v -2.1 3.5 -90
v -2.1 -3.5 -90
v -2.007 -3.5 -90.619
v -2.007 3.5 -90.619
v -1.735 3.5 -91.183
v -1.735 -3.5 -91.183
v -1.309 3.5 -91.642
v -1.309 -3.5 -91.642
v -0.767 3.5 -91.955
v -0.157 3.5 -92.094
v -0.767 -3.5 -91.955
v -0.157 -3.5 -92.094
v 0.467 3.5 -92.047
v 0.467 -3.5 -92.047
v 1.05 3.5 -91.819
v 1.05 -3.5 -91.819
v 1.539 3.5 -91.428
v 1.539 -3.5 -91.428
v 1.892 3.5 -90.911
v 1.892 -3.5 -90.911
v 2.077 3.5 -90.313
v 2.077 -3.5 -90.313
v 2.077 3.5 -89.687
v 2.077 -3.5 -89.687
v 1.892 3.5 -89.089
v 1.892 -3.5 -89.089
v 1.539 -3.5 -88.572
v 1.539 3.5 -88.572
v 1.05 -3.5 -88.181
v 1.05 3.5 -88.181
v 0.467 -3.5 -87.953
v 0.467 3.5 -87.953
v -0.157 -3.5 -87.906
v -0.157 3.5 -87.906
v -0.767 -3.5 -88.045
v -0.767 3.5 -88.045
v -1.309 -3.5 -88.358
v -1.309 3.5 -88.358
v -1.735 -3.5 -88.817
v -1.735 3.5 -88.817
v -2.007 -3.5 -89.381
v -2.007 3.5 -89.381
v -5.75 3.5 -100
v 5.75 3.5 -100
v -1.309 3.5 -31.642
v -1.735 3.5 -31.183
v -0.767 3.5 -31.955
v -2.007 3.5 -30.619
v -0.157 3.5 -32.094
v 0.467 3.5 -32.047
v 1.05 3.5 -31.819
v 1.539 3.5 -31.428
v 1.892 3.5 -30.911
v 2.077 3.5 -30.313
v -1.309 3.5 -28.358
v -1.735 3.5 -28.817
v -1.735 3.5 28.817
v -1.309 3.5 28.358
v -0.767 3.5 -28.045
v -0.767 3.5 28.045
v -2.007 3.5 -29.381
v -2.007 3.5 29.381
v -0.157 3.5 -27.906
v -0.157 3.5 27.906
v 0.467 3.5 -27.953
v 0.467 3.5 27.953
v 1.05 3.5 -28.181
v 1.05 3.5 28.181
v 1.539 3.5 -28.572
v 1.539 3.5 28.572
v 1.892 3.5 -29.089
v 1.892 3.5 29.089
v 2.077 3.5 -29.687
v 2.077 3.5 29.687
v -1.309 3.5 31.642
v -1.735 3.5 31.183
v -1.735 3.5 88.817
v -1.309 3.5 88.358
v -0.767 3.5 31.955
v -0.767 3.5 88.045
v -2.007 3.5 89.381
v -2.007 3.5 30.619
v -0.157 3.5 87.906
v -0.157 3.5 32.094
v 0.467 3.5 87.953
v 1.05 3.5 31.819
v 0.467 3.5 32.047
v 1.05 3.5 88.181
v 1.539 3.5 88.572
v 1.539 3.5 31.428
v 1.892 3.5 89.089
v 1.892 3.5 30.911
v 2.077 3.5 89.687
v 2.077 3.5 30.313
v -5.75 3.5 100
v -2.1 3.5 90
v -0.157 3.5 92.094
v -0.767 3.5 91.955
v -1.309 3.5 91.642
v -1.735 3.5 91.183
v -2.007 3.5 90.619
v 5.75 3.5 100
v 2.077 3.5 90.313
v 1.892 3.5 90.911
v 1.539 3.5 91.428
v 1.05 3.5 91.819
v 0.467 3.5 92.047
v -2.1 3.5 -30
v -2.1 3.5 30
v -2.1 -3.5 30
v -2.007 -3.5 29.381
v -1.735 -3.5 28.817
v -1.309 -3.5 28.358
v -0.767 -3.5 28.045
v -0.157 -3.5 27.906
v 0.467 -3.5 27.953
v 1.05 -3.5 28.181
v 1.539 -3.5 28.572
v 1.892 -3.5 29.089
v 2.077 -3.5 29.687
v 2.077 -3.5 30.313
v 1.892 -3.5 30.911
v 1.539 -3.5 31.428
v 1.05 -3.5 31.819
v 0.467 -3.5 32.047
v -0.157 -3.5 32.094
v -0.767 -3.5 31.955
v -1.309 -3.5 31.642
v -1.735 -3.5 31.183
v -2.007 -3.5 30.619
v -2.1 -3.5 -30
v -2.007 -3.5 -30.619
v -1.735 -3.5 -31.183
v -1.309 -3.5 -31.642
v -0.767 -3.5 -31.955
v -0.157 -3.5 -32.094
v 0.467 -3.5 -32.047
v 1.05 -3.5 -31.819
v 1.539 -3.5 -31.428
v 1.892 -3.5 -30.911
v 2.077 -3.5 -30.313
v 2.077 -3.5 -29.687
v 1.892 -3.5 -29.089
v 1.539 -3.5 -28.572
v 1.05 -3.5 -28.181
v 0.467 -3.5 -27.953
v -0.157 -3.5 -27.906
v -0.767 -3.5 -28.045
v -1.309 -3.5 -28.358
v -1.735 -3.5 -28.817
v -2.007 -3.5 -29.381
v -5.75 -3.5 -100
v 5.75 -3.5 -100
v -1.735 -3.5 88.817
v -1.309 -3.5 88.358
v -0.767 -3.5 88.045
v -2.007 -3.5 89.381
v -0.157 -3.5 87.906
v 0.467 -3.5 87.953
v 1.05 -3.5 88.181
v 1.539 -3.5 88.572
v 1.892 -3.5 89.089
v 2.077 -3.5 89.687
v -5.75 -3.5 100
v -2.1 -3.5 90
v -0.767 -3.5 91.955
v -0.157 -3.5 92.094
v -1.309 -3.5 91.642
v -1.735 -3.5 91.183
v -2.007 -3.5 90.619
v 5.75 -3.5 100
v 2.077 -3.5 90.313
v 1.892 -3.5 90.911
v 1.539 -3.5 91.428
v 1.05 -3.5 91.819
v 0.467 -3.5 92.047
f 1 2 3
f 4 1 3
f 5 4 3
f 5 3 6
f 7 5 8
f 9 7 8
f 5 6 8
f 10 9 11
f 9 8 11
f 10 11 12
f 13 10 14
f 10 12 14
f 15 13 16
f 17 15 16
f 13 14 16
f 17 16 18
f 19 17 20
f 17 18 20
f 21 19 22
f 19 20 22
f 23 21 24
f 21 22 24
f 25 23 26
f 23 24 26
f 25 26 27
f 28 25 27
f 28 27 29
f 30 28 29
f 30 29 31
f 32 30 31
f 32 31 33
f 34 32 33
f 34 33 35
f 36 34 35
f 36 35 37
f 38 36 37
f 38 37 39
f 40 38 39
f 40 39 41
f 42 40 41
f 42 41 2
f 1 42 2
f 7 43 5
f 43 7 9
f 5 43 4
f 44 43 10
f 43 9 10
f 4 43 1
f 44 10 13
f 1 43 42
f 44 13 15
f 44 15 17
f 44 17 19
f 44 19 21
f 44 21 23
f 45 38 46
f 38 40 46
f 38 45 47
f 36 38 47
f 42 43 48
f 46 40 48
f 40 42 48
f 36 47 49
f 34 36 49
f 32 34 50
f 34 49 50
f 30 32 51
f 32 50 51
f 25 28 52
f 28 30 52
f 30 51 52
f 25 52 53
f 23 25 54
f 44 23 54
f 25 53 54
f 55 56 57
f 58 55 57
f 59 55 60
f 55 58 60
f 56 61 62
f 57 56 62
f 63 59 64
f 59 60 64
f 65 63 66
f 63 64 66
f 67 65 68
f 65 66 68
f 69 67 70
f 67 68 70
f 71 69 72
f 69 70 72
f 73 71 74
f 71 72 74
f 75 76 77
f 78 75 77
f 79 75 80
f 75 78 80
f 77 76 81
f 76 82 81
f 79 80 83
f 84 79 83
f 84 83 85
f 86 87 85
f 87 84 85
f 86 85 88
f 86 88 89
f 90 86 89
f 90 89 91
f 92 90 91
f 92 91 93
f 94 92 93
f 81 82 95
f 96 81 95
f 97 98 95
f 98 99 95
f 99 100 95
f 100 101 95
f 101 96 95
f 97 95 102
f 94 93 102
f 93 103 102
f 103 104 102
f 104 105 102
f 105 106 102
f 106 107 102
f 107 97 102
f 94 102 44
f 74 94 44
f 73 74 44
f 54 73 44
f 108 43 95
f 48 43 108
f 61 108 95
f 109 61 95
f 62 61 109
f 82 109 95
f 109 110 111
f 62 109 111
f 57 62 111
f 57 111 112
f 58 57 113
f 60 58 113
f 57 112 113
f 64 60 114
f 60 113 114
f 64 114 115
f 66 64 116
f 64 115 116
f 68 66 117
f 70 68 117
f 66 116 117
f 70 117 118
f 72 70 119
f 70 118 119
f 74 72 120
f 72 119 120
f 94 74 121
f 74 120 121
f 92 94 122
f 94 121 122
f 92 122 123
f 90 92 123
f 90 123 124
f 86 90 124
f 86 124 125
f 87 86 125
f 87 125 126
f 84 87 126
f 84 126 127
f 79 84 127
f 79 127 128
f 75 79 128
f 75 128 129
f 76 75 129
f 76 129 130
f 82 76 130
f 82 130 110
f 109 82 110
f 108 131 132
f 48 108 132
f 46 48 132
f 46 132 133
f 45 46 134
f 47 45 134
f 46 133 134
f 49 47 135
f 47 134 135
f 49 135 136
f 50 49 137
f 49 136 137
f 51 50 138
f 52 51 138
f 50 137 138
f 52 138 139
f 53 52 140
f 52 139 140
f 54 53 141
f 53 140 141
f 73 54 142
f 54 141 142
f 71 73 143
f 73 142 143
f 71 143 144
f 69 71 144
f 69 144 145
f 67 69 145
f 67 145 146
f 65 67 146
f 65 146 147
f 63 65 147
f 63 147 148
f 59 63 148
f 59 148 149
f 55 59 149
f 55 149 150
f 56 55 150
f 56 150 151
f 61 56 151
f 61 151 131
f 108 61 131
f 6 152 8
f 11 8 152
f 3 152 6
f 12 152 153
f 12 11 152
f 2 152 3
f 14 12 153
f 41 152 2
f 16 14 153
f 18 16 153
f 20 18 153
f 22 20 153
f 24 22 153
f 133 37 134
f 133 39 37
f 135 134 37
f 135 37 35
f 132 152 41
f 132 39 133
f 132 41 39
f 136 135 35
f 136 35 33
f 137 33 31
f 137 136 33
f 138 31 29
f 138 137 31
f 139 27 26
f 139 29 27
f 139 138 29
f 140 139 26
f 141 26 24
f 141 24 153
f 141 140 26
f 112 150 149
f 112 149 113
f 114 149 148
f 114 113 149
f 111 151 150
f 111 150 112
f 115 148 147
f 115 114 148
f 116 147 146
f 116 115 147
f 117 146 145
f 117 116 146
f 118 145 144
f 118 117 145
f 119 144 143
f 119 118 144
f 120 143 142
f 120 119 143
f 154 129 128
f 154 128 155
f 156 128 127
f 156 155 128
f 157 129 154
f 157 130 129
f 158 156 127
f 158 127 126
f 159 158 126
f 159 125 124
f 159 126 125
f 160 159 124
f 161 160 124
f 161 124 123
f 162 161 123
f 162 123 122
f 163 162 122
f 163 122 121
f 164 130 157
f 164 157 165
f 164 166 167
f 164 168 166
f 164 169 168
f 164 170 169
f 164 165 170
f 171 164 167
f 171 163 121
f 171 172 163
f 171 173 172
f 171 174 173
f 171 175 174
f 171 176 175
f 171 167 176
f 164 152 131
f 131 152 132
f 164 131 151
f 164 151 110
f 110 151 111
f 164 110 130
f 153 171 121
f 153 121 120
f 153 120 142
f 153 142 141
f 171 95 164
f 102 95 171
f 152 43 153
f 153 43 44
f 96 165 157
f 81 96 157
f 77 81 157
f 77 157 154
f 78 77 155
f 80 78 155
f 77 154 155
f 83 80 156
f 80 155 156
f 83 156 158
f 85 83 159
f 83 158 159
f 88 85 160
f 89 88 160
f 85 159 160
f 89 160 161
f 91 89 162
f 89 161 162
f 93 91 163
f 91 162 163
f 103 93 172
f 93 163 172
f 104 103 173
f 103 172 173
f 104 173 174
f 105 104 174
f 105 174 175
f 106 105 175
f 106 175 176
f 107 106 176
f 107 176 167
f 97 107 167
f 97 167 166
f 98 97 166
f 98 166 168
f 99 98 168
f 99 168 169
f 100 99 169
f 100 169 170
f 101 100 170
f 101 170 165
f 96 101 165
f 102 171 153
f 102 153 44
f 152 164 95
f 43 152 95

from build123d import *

# Parameters (mm, degrees)
SKETCH1_W           = 11.5
SKETCH1_H           = 7
BOSS_EXTRUDE1_DEPTH = 100
M5_TAPPED_HOLE1_D   = 4.2


with BuildPart() as part:
    # Sketch1 → Boss-Extrude1 (new, symmetric)
    with BuildSketch(Plane.XY):
        Rectangle(SKETCH1_W, SKETCH1_H)
    extrude(amount=BOSS_EXTRUDE1_DEPTH, both=True)

    # M5 Tapped Hole1 (through all)
    with Locations(Plane(origin=(0, 3.5, 0), x_dir=(1, 0, 0), z_dir=(0, 1, 0))):
        with Locations((0, 90), (0, 30), (0, -30), (0, -90)):
            Hole(M5_TAPPED_HOLE1_D / 2)


solid = part.part
